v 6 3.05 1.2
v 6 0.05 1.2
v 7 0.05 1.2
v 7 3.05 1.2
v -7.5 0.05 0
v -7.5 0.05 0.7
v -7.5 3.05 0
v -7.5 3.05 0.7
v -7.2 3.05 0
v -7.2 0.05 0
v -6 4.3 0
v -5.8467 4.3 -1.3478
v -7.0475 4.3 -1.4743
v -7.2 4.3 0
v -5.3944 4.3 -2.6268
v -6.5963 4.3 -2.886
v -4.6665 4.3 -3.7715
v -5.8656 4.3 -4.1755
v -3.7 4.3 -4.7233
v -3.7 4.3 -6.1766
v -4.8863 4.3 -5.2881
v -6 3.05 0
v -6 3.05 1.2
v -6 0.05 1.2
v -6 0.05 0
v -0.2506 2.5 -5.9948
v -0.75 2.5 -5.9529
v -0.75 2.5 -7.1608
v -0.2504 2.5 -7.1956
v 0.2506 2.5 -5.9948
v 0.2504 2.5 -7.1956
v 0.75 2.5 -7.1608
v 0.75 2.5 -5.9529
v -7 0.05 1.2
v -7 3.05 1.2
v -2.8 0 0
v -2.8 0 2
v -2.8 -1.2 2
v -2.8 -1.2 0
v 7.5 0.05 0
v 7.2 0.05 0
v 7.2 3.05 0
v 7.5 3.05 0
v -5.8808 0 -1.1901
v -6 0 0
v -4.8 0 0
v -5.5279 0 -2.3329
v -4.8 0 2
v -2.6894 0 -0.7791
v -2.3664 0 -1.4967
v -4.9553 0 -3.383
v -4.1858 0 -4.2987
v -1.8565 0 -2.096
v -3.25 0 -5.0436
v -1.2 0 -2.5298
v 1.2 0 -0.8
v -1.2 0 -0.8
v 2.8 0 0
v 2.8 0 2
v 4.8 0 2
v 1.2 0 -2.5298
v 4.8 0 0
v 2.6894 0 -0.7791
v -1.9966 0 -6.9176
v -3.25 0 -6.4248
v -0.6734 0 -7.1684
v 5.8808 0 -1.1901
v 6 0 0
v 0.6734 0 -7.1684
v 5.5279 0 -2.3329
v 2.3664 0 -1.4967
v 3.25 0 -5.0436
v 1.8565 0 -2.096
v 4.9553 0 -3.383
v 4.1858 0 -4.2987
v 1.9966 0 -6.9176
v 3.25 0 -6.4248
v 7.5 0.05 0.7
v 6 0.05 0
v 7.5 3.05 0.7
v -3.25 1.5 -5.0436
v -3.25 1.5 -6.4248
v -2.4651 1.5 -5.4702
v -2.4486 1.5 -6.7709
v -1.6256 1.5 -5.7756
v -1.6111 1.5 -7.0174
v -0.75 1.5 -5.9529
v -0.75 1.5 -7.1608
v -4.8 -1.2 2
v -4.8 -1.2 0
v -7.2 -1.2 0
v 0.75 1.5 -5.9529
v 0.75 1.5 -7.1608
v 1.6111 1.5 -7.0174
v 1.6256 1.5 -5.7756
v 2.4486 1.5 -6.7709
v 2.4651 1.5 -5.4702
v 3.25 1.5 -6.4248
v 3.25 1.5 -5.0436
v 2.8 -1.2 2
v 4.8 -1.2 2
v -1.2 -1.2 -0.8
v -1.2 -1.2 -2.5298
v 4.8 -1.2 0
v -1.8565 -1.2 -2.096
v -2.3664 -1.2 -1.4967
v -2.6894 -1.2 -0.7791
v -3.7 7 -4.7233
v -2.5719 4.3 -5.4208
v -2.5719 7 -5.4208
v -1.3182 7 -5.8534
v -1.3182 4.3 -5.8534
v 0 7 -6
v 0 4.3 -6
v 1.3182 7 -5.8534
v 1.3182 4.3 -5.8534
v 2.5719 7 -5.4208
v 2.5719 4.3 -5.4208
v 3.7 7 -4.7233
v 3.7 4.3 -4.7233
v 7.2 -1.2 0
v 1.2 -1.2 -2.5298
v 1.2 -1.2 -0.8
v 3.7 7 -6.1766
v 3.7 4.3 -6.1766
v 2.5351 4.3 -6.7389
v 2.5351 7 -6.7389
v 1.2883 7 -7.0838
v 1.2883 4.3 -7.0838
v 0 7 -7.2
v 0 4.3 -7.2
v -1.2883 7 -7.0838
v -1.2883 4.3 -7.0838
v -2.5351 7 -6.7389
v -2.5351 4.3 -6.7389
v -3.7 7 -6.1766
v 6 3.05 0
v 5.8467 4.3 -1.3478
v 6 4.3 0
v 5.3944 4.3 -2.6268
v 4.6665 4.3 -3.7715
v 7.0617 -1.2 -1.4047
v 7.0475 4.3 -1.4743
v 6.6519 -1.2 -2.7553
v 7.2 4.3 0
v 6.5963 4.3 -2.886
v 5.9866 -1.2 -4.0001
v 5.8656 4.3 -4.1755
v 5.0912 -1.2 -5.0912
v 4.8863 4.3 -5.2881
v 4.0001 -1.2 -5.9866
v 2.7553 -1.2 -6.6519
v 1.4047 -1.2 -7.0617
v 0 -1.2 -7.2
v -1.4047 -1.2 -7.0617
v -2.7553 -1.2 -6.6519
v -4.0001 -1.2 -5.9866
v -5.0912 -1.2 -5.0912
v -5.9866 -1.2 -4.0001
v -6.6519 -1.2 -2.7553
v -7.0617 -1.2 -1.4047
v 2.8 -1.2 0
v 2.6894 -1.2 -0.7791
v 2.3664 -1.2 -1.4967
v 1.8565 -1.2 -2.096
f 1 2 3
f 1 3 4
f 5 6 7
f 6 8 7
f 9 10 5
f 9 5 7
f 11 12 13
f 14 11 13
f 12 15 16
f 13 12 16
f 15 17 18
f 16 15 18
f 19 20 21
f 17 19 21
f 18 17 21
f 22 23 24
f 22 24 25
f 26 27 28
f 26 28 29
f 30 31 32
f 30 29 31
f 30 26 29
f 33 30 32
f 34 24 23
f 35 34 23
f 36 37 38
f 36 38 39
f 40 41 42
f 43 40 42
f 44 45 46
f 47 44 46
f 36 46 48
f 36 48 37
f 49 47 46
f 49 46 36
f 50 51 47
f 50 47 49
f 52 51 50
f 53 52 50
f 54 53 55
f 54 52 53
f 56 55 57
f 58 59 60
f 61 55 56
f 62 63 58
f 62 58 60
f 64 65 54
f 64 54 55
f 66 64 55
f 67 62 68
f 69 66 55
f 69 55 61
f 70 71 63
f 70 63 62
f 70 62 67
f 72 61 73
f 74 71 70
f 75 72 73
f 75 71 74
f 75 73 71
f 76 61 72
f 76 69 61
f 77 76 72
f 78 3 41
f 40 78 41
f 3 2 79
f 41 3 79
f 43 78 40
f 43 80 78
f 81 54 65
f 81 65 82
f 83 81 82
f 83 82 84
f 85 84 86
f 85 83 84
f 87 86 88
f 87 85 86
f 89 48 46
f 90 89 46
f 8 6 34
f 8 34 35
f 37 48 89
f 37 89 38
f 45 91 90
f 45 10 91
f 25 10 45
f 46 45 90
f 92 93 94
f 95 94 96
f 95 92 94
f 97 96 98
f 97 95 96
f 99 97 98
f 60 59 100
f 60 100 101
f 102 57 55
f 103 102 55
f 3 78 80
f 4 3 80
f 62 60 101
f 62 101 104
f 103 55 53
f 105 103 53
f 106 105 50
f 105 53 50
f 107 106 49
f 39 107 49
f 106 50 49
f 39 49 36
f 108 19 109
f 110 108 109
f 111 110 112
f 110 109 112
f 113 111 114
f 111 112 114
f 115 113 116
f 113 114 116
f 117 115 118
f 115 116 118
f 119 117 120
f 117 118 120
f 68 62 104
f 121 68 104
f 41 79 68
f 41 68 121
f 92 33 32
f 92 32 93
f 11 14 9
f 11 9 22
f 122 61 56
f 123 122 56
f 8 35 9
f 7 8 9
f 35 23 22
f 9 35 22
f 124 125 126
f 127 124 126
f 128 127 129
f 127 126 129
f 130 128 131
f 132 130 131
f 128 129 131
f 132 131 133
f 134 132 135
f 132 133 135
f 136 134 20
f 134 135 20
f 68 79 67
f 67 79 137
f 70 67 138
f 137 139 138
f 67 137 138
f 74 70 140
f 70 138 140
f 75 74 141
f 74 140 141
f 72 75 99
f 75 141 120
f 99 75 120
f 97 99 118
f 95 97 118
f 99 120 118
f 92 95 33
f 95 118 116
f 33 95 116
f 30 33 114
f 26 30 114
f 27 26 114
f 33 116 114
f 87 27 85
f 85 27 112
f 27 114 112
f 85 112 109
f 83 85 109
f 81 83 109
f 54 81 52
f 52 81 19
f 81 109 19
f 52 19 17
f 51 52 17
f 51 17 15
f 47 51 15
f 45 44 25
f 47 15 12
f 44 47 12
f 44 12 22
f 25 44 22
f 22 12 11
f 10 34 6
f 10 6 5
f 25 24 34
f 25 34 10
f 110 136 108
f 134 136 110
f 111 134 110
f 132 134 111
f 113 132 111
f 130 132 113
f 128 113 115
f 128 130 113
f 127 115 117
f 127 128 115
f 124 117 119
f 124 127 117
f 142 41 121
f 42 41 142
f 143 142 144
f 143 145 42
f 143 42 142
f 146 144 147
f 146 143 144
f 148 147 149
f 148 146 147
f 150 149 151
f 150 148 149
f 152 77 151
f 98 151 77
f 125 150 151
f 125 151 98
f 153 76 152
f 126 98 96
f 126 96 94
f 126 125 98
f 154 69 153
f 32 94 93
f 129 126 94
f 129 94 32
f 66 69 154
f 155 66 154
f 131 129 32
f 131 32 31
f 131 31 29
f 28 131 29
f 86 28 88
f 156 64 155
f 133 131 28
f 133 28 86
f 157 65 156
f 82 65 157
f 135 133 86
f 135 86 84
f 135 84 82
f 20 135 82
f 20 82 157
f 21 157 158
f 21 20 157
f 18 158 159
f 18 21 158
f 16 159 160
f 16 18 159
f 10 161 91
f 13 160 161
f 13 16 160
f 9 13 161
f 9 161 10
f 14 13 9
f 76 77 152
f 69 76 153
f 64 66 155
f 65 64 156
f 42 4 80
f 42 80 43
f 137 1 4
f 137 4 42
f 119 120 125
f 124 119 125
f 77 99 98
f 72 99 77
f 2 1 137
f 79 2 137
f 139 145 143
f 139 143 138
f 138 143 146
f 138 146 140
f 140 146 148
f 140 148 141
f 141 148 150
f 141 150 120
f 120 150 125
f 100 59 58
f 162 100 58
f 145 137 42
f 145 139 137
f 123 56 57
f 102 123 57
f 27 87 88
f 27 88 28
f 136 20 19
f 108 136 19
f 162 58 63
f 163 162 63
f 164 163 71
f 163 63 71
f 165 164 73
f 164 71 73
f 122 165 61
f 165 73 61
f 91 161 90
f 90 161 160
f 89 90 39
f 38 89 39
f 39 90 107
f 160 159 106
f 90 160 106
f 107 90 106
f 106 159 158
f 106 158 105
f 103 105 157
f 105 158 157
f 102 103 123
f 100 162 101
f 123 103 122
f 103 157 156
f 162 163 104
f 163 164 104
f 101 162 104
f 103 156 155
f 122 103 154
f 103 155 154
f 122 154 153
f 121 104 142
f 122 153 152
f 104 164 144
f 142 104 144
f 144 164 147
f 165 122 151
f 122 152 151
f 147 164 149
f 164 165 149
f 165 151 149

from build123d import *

# Parameters (mm, degrees)
SKETCH1_W                = 6
SKETCH1_H                = 1.2
SKETCH1_W_2              = 1.2
SKETCH1_H_2              = 4.3
REVOLVE1_ANGLE           = 180
REVOLVE2_START           = 4.3
REVOLVE2_DEPTH           = 2.7
CUT_EXTRUDE1_DEPTH       = 10
CUT_EXTRUDE2_DEPTH       = 10
SKETCH5_W                = 2
SKETCH5_H                = 2
BOSS_EXTRUDE1_DEPTH      = 1.2
SKETCH6_W                = 1.2
SKETCH6_H                = 3
BOSS_EXTRUDE2_DEPTH      = 1.5
CHAMFER1_SIZE            = 0.5
CHAMFER1_OF_MIRROR1_SIZE = 0.5


# Read off the part's stored shape, not the designer's step: Revolve2
with BuildPart() as part:
    # Sketch1 → Revolve1 (revolve)
    with BuildSketch(Plane.XY):
        with Locations((3, -0.6)):
            Rectangle(SKETCH1_W, SKETCH1_H)
        with Locations((6.6, -0.6)):
            Rectangle(SKETCH1_W_2, SKETCH1_H)
        with Locations((6.6, 2.15)):
            Rectangle(SKETCH1_W_2, SKETCH1_H_2)
    revolve(axis=Axis((0, -1.2, 0), (0, 1, 0)), revolution_arc=REVOLVE1_ANGLE)

    # Revolve2 outline → Revolve2 (add)
    with BuildSketch(Plane(origin=(0, 0, 0), x_dir=(1, 0, 0), z_dir=(0, 1, 0)).offset(REVOLVE2_START)):
        with BuildLine():
            ThreePointArc((3.7, 6.176568627), (0, 7.2), (-3.7, 6.176568627))
            Line((-3.7, 6.176568627), (-3.7, 4.723346271))
            ThreePointArc((-3.7, 4.723346271), (0, 6), (3.7, 4.723346271))
            Line((3.7, 4.723346271), (3.7, 6.176568627))
        make_face()
    extrude(amount=REVOLVE2_DEPTH)

    # Sketch3 → Cut-Extrude1 (cut)
    with BuildSketch(Plane.XY):
        Polygon((-3.25, 1.5), (-0.75, 1.5), (-0.75, 2.5), (0.75, 2.5), (0.75, 1.5), (3.25, 1.5), (3.25, 0), (-3.25, 0), align=None)
    extrude(amount=-CUT_EXTRUDE1_DEPTH, mode=Mode.SUBTRACT)

    # Sketch4 → Cut-Extrude2 (cut)
    with BuildSketch(Plane(origin=(0, 0, 0), x_dir=(1, 0, 0), z_dir=(0, 1, 0))):
        with BuildLine():
            Line((-1.2, 0.8), (-1.2, 2.529822128))
            ThreePointArc((-1.2, 2.529822128), (-2.366431913, 1.496662955), (-2.8, 0))
            Line((-2.8, 0), (2.8, 0))
            ThreePointArc((2.8, 0), (2.366431913, 1.496662955), (1.2, 2.529822128))
            Line((1.2, 2.529822128), (1.2, 0.8))
            Line((1.2, 0.8), (-1.2, 0.8))
        make_face()
    extrude(amount=-CUT_EXTRUDE2_DEPTH, mode=Mode.SUBTRACT)

    # Sketch5 → Boss-Extrude1 (add)
    with BuildSketch(Plane(origin=(0, 0, 0), x_dir=(1, 0, 0), z_dir=(0, 1, 0))):
        with Locations((-3.8, -1)):
            Rectangle(SKETCH5_W, SKETCH5_H)
        with Locations((3.8, -1)):
            Rectangle(SKETCH5_W, SKETCH5_H)
    extrude(amount=-BOSS_EXTRUDE1_DEPTH)

    # Sketch6 → Boss-Extrude2 (add)
    with BuildSketch(Plane(origin=(6, 0, 0), x_dir=(0, 0, -1), z_dir=(1, 0, 0))):
        with Locations((-0.6, 1.55)):
            Rectangle(SKETCH6_W, SKETCH6_H)
    boss_extrude2 = extrude(amount=BOSS_EXTRUDE2_DEPTH)

    # Chamfer1
    chamfer1_edges = [part.edges().sort_by_distance(p)[0] for p in [
        (7.5, 1.55, 1.2),
    ]]
    chamfer(chamfer1_edges, length=CHAMFER1_SIZE)

    # Mirror1: Boss-Extrude2 across plane
    add(boss_extrude2.mirror(Plane(origin=(0, 0, 0), x_dir=(0, 0, 1), z_dir=(1, 0, 0))))

    # Chamfer1 of Mirror1
    chamfer1_of_mirror1_edges = [part.edges().sort_by_distance(p)[0] for p in [
        (-7.5, 1.55, 1.2),
    ]]
    chamfer(chamfer1_of_mirror1_edges, length=CHAMFER1_OF_MIRROR1_SIZE)


solid = part.part
